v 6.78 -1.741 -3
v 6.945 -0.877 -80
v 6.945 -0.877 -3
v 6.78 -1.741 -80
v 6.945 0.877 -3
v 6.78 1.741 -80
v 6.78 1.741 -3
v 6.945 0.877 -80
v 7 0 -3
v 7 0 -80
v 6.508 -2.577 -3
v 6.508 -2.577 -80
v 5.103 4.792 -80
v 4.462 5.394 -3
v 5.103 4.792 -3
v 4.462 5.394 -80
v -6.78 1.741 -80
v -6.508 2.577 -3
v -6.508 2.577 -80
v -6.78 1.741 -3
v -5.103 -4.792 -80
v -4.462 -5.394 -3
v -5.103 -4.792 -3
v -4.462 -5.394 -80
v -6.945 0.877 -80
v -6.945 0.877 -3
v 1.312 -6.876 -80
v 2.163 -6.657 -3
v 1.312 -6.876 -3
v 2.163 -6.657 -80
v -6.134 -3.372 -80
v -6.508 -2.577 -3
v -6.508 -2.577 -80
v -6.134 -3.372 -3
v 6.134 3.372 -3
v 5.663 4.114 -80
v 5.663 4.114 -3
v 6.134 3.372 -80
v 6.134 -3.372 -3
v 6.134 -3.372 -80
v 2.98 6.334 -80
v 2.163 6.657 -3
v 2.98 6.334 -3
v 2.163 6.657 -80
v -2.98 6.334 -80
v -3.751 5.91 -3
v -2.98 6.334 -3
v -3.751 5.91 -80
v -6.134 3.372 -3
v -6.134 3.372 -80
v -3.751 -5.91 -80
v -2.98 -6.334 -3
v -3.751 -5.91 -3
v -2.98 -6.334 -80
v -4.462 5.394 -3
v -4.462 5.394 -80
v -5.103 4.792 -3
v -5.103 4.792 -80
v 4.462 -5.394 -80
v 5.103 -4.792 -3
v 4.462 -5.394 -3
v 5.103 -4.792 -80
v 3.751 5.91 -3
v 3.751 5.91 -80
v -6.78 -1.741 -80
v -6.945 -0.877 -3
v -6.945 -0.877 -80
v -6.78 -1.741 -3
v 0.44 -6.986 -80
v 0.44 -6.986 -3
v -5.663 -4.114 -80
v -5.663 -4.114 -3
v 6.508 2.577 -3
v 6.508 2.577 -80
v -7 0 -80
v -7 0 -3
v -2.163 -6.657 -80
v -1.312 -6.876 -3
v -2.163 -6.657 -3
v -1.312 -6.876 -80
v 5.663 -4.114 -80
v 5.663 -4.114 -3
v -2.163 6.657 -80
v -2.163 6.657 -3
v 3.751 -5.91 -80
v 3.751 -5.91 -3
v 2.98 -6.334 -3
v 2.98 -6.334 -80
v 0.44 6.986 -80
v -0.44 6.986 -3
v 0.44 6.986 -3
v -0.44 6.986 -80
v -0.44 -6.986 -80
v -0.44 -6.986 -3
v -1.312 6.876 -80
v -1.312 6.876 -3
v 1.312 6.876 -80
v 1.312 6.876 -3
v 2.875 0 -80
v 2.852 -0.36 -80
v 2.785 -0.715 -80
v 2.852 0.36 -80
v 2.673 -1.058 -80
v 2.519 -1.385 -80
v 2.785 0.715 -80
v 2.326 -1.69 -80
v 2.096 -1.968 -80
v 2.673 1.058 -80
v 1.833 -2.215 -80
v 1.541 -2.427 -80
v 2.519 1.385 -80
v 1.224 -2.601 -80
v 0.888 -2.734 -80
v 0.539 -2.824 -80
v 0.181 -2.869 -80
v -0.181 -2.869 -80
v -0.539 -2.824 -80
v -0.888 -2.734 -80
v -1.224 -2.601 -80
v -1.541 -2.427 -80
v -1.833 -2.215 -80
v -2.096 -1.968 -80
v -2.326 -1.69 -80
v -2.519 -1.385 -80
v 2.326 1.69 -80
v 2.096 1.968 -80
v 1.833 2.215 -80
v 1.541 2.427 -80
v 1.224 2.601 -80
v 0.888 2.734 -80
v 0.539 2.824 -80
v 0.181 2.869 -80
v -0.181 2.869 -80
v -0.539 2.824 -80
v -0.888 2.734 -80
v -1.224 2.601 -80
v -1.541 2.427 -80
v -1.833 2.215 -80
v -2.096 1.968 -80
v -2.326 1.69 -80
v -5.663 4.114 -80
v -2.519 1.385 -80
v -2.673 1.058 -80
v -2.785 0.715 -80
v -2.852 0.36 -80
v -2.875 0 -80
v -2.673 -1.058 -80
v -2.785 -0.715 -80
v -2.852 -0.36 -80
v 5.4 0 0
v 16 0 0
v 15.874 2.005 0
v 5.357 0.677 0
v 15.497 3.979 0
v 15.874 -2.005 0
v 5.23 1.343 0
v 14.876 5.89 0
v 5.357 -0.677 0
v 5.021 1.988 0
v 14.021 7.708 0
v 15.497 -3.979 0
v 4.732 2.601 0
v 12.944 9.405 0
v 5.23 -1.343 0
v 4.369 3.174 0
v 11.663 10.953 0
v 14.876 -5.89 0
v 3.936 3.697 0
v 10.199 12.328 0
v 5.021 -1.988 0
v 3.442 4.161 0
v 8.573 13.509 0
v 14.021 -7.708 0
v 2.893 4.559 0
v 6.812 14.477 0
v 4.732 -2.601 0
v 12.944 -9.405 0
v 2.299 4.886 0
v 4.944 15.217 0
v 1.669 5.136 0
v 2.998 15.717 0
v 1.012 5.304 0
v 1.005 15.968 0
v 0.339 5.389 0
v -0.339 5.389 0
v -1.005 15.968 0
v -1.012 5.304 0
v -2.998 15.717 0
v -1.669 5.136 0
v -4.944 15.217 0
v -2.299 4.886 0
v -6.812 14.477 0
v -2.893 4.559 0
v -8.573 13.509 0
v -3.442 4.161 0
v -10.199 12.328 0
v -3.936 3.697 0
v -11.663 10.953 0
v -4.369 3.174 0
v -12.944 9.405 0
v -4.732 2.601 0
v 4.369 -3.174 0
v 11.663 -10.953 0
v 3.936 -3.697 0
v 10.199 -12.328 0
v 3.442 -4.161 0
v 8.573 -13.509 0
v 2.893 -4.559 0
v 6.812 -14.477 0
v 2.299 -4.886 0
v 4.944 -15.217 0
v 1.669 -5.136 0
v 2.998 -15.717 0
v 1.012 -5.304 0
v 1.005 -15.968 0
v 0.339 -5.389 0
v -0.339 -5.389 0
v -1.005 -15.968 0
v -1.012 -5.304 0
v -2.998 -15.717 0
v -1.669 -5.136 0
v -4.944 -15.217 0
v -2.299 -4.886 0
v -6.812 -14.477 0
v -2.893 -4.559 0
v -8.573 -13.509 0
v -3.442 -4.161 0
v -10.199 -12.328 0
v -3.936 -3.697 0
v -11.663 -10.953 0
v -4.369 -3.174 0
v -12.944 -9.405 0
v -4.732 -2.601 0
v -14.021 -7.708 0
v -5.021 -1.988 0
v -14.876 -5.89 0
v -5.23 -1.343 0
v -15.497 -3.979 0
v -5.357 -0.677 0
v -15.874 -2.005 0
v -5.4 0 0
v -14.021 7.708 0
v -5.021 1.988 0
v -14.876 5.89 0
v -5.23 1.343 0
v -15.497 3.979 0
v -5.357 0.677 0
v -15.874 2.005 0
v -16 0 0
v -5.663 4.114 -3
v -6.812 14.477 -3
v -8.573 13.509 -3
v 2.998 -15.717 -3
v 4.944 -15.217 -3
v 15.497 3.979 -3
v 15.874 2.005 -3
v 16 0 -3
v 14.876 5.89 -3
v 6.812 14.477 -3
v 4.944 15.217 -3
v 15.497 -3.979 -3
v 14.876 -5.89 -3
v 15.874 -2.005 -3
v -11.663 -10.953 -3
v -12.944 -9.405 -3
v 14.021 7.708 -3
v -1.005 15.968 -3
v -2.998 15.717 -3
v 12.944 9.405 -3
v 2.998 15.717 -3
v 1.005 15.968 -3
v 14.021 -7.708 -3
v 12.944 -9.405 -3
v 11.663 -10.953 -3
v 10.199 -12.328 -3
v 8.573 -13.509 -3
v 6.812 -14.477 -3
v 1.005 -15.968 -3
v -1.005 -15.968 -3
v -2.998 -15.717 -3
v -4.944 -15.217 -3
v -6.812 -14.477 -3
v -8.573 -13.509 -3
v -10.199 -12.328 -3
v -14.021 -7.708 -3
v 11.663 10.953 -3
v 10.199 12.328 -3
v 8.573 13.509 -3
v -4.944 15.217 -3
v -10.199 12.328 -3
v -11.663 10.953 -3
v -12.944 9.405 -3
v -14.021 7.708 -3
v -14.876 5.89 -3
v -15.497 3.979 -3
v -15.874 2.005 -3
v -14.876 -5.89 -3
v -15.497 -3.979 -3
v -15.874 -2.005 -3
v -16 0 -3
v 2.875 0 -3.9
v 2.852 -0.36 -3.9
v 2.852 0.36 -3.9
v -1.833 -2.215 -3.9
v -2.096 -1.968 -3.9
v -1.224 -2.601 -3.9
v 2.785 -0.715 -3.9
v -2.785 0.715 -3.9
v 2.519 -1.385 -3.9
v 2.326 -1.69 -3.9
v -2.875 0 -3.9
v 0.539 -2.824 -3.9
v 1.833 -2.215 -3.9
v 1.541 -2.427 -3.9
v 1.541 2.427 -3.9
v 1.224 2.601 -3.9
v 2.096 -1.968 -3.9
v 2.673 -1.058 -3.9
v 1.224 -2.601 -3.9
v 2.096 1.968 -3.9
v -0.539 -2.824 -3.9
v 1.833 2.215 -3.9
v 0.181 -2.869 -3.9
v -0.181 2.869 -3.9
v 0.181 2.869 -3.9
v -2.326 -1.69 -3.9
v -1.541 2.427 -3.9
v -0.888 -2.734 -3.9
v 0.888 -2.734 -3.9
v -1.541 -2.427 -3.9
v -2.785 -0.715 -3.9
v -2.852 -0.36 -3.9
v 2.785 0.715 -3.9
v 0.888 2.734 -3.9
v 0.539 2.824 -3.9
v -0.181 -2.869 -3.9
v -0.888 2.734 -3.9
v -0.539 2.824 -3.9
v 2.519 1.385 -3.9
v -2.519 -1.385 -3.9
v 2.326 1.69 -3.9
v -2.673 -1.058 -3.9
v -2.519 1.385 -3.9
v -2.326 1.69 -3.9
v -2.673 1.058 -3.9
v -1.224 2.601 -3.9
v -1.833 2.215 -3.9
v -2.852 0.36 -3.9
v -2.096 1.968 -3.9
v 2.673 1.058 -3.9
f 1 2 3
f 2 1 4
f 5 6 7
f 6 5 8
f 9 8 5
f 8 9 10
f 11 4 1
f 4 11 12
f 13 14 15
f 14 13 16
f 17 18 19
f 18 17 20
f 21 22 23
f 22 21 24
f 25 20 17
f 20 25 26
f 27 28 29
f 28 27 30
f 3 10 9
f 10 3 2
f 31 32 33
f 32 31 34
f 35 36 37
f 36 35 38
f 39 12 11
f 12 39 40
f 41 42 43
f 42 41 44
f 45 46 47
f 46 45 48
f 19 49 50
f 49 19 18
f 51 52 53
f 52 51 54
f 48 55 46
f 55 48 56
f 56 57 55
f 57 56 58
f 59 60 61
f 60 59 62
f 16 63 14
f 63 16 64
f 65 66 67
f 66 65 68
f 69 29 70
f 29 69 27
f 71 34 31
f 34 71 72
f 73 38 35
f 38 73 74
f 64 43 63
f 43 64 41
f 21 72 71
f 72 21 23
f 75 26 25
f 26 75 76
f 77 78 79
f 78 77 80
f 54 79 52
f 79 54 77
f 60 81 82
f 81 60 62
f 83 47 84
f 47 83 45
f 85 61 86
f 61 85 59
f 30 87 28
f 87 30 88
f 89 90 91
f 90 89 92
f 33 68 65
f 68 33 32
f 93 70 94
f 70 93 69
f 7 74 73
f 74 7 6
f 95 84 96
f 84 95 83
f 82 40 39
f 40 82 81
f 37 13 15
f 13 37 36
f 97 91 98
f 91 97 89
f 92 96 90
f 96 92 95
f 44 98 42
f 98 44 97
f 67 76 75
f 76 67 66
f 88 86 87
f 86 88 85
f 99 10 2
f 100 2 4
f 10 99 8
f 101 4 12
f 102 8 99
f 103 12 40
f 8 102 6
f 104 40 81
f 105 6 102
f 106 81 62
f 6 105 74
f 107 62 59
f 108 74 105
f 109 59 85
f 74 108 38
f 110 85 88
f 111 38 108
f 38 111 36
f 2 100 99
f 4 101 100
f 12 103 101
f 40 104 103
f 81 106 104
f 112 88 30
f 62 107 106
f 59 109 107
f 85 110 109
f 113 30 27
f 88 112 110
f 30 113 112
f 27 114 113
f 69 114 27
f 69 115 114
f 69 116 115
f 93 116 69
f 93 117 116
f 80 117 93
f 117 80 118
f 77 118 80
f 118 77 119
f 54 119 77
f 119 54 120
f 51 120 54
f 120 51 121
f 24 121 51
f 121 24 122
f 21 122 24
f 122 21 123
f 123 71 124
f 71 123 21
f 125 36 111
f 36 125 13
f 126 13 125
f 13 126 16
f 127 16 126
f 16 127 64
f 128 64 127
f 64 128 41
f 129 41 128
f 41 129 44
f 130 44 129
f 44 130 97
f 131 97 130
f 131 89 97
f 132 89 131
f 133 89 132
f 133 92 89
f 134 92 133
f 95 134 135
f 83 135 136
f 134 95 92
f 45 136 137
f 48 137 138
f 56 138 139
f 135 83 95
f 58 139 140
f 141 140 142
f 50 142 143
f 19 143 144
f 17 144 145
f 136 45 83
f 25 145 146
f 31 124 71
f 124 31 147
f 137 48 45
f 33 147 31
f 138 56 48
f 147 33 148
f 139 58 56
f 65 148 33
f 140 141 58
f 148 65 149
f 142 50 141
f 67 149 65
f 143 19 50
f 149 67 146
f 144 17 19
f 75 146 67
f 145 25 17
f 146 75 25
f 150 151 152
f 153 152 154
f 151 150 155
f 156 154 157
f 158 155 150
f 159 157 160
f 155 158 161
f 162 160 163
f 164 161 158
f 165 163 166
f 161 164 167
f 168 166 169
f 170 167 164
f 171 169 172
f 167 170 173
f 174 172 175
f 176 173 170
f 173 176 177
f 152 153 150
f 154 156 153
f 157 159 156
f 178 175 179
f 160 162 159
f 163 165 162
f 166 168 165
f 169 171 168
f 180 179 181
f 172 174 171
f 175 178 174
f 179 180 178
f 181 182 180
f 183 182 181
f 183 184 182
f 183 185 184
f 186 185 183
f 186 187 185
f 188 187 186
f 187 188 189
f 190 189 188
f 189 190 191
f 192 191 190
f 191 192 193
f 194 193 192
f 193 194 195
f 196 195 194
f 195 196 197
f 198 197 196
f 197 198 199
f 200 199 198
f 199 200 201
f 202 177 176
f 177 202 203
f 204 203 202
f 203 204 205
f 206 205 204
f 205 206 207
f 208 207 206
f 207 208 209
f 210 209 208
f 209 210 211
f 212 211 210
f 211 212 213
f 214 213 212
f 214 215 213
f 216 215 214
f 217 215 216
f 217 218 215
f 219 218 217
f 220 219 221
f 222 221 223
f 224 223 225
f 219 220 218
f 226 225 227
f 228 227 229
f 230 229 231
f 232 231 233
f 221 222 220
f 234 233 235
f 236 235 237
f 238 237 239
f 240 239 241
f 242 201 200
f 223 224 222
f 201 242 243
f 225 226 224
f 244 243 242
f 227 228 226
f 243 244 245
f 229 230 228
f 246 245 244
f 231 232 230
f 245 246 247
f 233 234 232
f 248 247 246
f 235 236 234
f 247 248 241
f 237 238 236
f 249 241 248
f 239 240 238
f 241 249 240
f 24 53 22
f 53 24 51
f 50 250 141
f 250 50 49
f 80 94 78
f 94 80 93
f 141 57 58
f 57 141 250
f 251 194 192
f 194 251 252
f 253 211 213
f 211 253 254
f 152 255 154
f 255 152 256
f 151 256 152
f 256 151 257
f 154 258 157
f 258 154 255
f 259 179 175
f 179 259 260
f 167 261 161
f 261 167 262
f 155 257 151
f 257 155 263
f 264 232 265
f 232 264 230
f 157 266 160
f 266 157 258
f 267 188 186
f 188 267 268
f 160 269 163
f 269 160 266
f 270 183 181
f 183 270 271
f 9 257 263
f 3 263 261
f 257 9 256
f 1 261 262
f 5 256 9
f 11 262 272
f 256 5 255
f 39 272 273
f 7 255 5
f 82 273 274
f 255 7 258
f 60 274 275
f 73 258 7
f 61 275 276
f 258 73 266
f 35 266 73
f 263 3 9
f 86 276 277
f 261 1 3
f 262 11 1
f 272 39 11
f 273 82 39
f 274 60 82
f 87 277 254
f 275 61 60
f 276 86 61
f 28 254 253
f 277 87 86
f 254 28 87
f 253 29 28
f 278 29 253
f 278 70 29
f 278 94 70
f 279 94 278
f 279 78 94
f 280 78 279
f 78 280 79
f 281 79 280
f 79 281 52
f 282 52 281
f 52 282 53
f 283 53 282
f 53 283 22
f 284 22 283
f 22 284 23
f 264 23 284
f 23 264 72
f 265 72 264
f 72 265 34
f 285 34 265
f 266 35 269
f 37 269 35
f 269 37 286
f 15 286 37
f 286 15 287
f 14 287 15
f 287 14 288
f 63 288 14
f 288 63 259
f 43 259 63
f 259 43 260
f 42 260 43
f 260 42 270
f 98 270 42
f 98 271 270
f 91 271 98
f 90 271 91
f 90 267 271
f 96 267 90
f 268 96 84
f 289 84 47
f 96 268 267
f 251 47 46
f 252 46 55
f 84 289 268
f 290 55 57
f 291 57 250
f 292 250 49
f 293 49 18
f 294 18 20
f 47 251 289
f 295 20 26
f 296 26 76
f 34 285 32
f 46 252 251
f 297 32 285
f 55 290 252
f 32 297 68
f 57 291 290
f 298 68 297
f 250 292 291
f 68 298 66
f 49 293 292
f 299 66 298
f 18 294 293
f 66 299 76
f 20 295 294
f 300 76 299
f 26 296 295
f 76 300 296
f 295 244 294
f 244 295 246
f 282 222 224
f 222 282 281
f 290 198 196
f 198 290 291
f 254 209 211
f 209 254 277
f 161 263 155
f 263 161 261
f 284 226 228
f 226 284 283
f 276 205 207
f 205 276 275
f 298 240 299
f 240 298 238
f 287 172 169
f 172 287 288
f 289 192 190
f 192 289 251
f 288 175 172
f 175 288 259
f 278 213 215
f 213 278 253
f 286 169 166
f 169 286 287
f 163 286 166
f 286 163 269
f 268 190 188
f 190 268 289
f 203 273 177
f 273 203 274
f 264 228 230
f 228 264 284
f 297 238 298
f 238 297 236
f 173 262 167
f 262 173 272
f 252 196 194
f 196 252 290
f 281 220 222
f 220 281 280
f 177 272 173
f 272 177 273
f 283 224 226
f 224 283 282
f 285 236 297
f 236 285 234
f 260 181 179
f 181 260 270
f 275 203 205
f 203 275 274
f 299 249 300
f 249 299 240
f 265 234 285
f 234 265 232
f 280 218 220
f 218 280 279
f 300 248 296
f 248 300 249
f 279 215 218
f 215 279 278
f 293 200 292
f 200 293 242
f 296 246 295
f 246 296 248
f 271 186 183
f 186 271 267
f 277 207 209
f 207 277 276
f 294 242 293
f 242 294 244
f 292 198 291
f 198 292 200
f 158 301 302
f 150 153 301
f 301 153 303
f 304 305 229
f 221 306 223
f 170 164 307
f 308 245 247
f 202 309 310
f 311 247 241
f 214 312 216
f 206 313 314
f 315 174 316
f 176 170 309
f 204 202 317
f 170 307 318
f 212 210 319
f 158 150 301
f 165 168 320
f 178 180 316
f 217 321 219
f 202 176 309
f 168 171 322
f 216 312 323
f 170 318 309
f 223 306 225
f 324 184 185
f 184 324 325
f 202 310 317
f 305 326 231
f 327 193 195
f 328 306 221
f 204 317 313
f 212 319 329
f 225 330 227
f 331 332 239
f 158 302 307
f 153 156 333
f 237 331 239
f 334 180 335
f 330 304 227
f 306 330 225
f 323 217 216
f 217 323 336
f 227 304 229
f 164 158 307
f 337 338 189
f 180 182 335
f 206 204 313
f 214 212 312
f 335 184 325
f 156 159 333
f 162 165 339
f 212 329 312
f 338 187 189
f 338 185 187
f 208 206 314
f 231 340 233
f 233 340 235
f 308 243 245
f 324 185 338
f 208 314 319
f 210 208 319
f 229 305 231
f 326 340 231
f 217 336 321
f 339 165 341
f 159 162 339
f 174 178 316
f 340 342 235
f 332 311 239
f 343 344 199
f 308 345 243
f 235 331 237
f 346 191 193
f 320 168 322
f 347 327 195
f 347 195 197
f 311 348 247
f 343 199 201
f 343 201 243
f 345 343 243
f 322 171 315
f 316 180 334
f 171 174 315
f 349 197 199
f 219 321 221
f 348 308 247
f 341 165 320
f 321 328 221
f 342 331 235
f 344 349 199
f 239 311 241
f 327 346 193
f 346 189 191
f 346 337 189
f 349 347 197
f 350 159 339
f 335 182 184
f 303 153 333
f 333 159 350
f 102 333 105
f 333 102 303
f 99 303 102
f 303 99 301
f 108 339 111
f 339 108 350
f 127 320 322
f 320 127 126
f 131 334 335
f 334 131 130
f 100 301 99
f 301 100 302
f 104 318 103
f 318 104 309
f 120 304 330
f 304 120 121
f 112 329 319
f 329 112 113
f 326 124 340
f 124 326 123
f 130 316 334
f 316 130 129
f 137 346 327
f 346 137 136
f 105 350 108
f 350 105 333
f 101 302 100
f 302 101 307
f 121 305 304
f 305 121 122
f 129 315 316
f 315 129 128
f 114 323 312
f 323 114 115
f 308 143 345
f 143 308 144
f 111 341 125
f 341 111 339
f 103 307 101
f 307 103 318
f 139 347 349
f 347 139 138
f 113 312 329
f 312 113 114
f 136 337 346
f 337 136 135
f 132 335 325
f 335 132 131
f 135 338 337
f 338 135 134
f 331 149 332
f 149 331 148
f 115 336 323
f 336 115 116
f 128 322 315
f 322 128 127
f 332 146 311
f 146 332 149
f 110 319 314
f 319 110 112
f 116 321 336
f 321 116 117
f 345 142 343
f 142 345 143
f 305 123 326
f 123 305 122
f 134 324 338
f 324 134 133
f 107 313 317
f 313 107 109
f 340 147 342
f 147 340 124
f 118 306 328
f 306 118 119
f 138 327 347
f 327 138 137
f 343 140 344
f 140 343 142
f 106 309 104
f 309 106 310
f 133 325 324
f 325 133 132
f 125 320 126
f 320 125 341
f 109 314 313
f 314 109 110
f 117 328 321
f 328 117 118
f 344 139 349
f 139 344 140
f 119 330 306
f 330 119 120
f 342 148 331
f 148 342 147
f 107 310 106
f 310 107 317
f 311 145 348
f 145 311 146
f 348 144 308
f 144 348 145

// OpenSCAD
$fn = 50;


difference() {
	union() {
		translate(v = [0, 0, -80.0000000000]) {
			cylinder(h = 80, r = 7.0000000000);
		}
		translate(v = [0, 0, -3.0000000000]) {
			cylinder(h = 3, r = 16.0000000000);
		}
	}
	union() {
		translate(v = [0, 0, 0]) {
			rotate(a = [0, 0, 0]) {
				difference() {
					union() {
						#translate(v = [0, 0, -80.0000000000]) {
							cylinder(h = 80, r = 2.6000000000);
						}
						#translate(v = [0, 0, -3.9000000000]) {
							cylinder(h = 3.9000000000, r1 = 2.8750000000, r2 = 5.4000000000);
						}
						#translate(v = [0, 0, -80.0000000000]) {
							cylinder(h = 80, r = 2.8750000000);
						}
						#translate(v = [0, 0, -80.0000000000]) {
							cylinder(h = 80, r = 2.6000000000);
						}
					}
					union();
				}
			}
		}
	}
}
